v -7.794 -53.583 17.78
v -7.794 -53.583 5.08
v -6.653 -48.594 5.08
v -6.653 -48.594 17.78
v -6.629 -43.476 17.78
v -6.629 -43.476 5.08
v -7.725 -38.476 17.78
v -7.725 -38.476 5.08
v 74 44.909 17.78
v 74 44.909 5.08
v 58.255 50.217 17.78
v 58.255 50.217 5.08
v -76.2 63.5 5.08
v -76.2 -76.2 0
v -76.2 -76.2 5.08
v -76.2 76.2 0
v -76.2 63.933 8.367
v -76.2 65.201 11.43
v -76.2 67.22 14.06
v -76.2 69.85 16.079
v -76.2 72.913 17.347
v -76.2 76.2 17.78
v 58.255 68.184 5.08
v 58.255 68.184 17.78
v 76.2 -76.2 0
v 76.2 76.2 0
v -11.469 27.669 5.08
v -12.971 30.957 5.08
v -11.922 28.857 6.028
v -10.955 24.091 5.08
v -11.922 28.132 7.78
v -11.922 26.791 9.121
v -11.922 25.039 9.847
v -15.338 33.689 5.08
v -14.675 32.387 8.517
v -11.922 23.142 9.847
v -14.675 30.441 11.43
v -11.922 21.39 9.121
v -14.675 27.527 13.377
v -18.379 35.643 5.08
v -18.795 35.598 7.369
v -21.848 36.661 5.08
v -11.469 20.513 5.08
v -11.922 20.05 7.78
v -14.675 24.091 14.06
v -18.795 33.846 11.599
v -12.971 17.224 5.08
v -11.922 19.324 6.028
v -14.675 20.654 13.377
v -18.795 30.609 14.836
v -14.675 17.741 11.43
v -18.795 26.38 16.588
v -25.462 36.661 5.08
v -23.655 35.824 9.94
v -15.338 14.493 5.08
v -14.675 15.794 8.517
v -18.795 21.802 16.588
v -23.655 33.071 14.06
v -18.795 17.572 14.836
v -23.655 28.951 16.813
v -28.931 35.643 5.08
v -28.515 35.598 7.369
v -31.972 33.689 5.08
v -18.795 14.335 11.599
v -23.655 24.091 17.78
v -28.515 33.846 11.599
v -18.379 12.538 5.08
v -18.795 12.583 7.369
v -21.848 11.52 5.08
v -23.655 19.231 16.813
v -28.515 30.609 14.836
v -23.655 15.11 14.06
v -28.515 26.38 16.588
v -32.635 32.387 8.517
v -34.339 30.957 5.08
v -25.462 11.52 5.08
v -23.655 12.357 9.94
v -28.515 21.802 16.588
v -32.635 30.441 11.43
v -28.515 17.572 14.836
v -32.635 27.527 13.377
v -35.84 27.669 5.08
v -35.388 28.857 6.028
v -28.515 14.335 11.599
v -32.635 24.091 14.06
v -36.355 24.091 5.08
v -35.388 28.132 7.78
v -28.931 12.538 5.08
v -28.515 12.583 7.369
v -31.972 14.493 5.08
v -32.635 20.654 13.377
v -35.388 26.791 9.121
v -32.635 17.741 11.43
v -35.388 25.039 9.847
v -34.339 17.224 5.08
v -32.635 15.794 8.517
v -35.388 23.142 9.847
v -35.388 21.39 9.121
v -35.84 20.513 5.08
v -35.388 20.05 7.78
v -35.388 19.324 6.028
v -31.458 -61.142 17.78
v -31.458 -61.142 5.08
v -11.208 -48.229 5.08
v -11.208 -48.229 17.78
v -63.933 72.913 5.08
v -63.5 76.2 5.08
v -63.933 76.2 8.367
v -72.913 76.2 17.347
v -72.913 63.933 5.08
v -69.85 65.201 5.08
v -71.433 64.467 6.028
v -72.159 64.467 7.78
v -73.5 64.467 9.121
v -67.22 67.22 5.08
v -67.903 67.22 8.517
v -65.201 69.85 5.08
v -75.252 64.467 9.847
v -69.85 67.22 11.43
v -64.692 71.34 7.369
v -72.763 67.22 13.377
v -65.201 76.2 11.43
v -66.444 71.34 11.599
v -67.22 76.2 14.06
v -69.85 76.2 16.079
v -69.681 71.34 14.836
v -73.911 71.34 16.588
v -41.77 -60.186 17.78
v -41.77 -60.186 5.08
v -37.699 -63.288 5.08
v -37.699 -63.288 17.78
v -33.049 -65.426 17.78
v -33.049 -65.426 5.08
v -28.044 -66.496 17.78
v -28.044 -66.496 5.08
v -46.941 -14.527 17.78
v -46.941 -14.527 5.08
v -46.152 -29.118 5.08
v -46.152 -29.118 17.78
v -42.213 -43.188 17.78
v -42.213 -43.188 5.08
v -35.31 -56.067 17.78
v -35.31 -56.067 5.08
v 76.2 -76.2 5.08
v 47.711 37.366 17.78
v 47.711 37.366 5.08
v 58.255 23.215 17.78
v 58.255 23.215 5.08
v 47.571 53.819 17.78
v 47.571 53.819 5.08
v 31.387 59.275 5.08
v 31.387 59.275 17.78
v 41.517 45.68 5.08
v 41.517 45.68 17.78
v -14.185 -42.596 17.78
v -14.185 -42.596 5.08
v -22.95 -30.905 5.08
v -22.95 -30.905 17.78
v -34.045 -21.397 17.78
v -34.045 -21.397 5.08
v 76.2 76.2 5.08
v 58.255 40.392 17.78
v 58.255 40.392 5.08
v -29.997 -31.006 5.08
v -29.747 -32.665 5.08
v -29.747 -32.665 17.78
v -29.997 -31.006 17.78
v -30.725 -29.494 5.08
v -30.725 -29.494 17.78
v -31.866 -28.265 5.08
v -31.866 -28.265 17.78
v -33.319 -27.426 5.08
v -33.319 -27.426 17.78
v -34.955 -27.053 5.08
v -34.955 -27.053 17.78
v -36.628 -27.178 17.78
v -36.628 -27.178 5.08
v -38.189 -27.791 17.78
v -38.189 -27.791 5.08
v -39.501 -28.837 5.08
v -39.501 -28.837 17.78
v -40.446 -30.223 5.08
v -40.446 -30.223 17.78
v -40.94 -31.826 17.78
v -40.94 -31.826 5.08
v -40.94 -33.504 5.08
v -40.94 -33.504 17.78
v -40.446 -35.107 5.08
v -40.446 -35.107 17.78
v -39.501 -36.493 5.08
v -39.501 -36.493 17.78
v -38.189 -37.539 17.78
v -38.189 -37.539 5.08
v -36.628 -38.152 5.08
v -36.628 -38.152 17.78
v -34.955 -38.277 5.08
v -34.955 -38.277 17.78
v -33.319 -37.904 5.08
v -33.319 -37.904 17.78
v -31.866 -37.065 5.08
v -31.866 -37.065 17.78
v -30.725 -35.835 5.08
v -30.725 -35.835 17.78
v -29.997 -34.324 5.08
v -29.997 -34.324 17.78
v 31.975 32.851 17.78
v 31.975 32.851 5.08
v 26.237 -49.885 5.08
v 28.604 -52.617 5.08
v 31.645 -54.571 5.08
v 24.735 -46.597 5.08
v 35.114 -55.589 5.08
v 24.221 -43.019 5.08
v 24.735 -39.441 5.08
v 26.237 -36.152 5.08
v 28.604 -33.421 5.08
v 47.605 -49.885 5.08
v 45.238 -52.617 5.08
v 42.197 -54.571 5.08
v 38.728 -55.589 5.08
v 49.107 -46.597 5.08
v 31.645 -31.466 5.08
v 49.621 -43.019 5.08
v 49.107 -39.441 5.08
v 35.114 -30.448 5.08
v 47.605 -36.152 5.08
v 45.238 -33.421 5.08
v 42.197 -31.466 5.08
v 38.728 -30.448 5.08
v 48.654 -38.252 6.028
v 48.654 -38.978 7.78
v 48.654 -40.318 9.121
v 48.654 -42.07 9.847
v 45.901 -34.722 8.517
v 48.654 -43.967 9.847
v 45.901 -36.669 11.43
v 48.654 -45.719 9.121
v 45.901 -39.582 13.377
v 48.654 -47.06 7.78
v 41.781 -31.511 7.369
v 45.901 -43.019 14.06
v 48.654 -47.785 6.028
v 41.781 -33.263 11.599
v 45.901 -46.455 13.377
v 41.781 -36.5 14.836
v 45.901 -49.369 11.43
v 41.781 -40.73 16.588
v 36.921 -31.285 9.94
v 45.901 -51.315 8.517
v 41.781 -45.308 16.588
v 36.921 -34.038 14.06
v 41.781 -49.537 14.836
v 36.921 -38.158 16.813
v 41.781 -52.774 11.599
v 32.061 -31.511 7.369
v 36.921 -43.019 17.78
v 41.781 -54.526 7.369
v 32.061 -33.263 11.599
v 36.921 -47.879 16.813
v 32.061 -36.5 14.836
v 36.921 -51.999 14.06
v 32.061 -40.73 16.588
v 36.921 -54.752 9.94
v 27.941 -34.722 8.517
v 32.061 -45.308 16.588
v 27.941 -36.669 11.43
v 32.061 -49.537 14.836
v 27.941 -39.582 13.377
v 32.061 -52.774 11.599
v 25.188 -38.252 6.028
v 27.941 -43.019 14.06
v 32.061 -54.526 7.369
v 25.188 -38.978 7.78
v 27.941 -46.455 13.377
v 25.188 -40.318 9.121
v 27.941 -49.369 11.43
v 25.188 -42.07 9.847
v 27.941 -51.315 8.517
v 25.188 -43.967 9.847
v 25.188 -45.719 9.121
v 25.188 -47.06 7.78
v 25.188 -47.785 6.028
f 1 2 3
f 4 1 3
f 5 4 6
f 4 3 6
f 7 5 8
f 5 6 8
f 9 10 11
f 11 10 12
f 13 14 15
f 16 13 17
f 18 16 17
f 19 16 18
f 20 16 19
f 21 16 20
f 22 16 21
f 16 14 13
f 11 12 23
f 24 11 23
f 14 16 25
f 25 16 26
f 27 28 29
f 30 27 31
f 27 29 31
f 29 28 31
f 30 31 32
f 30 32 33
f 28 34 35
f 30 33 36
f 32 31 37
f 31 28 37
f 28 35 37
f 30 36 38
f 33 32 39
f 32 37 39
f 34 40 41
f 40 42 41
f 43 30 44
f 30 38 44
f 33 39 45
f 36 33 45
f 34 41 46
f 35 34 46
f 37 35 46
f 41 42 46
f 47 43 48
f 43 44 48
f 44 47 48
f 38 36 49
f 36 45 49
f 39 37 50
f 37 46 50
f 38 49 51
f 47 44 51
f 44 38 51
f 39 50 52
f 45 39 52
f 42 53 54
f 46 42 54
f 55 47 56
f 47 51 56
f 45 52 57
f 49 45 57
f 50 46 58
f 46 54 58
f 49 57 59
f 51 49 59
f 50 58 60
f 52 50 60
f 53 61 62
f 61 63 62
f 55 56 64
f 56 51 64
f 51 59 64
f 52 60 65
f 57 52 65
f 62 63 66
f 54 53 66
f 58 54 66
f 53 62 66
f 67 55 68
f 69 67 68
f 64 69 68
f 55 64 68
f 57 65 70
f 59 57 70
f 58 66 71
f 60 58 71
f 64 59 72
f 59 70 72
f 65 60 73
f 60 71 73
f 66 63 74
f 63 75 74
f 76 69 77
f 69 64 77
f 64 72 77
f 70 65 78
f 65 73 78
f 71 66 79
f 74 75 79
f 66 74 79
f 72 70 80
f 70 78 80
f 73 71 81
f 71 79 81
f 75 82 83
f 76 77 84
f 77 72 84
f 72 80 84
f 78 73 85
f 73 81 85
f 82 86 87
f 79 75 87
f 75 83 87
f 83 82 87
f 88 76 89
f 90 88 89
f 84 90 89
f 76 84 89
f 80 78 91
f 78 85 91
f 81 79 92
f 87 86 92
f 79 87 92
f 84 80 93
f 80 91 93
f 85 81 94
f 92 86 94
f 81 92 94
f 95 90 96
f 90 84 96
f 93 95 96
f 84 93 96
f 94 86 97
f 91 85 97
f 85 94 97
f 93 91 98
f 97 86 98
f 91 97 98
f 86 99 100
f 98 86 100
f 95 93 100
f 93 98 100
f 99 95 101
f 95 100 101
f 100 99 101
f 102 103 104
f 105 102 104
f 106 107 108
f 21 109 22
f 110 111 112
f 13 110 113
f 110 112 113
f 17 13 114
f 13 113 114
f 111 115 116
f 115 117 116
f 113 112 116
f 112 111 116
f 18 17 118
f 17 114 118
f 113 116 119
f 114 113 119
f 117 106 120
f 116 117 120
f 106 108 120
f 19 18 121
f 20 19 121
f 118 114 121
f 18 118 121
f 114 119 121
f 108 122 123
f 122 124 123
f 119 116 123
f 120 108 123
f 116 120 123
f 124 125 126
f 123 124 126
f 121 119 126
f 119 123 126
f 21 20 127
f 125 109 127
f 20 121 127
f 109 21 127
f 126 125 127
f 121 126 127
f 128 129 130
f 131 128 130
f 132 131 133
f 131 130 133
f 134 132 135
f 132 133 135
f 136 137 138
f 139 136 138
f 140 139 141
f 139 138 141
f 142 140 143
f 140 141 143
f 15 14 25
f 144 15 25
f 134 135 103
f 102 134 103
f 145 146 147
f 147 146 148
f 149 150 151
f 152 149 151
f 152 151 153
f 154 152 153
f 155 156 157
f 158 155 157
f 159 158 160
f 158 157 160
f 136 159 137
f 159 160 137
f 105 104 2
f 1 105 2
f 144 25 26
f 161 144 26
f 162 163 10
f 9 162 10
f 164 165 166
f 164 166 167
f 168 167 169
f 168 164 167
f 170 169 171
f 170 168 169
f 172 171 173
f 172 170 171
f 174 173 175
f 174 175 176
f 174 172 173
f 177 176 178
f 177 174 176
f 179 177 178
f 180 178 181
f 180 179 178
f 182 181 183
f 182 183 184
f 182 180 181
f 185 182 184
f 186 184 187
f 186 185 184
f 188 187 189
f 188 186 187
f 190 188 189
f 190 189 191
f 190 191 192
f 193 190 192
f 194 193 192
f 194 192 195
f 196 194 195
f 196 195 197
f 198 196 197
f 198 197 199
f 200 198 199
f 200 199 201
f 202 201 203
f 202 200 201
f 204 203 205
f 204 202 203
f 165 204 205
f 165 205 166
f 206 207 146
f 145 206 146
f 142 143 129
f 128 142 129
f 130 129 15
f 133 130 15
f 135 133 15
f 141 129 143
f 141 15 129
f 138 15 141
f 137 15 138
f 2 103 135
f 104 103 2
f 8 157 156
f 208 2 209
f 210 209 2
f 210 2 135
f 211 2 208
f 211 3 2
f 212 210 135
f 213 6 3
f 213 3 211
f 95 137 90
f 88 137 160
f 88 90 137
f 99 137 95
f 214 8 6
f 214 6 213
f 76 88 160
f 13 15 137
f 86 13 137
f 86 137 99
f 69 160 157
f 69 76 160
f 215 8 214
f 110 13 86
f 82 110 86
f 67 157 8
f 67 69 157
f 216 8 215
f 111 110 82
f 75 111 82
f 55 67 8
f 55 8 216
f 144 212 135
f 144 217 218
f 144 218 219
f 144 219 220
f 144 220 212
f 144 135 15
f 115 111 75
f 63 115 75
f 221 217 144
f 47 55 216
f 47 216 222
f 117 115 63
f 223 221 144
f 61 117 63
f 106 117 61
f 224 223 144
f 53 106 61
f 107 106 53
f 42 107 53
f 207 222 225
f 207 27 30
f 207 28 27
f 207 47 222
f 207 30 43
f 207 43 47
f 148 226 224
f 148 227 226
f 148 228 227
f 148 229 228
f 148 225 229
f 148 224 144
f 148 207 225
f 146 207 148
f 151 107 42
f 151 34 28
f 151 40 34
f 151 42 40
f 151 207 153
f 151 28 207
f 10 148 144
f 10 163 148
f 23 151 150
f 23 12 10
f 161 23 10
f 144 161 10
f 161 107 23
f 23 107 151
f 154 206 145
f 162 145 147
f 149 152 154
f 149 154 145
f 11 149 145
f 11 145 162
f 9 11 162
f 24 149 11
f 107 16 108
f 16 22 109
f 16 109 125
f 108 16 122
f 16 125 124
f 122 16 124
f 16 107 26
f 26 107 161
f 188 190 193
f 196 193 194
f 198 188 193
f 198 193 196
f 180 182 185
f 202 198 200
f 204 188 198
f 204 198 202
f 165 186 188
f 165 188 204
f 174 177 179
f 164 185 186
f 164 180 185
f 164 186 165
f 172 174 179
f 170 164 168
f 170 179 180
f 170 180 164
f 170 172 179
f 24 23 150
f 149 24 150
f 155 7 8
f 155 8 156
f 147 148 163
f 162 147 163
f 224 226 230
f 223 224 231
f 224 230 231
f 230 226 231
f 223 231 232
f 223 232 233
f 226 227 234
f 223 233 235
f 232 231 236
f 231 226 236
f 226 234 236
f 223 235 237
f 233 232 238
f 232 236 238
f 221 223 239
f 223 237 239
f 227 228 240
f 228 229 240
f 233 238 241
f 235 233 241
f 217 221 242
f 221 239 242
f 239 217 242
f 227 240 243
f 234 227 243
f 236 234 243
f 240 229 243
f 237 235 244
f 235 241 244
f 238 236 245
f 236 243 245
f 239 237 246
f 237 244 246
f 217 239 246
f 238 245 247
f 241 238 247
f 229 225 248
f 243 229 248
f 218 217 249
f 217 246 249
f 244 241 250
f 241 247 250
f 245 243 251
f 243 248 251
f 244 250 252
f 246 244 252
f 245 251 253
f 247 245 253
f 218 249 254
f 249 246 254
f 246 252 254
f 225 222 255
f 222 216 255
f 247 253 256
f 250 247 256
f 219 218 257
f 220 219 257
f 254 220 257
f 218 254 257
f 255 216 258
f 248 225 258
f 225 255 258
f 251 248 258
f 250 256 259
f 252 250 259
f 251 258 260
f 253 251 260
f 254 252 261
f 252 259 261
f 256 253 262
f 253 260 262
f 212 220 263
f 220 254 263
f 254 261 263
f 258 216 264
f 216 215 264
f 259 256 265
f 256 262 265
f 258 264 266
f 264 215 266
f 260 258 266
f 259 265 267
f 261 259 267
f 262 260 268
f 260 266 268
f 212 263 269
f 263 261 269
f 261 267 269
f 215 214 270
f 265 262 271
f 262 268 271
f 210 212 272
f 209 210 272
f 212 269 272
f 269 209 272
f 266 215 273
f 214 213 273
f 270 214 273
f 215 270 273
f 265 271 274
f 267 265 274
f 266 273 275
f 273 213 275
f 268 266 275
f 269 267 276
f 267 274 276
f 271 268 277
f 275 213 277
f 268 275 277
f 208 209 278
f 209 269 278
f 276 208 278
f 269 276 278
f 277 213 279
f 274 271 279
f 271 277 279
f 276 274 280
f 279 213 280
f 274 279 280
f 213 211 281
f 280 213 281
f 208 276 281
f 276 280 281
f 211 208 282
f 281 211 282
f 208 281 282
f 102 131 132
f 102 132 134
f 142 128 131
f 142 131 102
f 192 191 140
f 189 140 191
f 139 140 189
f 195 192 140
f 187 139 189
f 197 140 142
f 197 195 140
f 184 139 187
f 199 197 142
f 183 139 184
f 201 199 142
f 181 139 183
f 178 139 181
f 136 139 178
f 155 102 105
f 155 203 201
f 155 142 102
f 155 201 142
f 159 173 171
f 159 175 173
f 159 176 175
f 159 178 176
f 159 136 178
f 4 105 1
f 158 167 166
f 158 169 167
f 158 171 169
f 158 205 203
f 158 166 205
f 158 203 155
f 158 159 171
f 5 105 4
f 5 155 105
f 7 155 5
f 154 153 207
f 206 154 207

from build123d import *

# Parameters (mm, degrees)
F0_W     = 152.4
F0_H     = 152.4
F2_DEPTH = 5.08
F5_ANGLE = 90
F6_ANGLE = 180
F7_ANGLE = 180
F4_R     = 5.6279425354
F8_DEPTH = 12.7


with BuildPart() as f2:
    # F0 (on Top) → F2 (new body)
    with BuildSketch(Plane.XY):
        Rectangle(F0_W, F0_H)
    extrude(amount=F2_DEPTH)

    # F4 (on face) → F5 (revolve)
    with BuildSketch(Plane.XY.offset(5.08)):
        with BuildLine():
            Line((-76.2, 76.2), (-76.2, 63.5))
            ThreePointArc((-76.2, 63.5), (-67.2197438789, 67.2197438789), (-63.5, 76.2))
            Line((-63.5, 76.2), (-76.2, 76.2))
        make_face()
    revolve(axis=Axis((-76.2, 0, 5.08), (0, -1, 0)), revolution_arc=F5_ANGLE)

    # F4 (on face) → F6 (revolve)
    with BuildSketch(Plane.XY.offset(5.08)):
        with BuildLine():
            Line((24.2210256122, -43.0185761551), (49.6210256122, -43.0185761551))
            ThreePointArc((49.6210256122, -43.0185761551), (36.9210256122, -30.3185761551), (24.2210256122, -43.0185761551))
        make_face()
    revolve(axis=Axis((36.9210256122, -43.0185761551, 5.08), (1, 0, 0)), revolution_arc=F6_ANGLE)

    # F4 (on face) → F7 (revolve)
    with BuildSketch(Plane.XY.offset(5.08)):
        with BuildLine():
            ThreePointArc((-10.9549105823, 24.090602994), (-23.6549105823, 36.790602994), (-36.3549105823, 24.090602994))
            Line((-36.3549105823, 24.090602994), (-10.9549105823, 24.090602994))
        make_face()
    revolve(axis=Axis((-23.6549105823, 24.090602994, 5.08), (1, 0, 0)), revolution_arc=F7_ANGLE)

    # F4 (on face) → F8 (join)
    with BuildSketch(Plane.XY.offset(5.08)):
        Polygon((47.570896451, 53.8189061847), (31.3873370203, 59.2746157033), (41.5168850169, 45.6796259761), (31.9747962058, 32.8508205712), (47.7112500038, 37.36609329), (58.2554601133, 23.2145804912), (58.2554601133, 40.3915515578), (74.0002126055, 44.9092054273), (58.2554601133, 50.2169868464), (58.2554601133, 68.1837052107), align=None)
        with BuildLine():
            ThreePointArc((-35.3100343123, -56.0667765948), (-33.4447317203, -58.6502472307), (-31.4584446243, -61.1419008701))
            Line((-31.4584446243, -61.1419008701), (-11.2081296183, -48.2286563014))
            ThreePointArc((-11.2081296183, -48.2286563014), (-12.6293719871, -45.3766842792), (-14.1848974706, -42.5956746142))
            ThreePointArc((-14.1848974706, -42.5956746142), (-28.2369814707, -25.8469443278), (-46.9412207919, -14.5273832774))
            ThreePointArc((-46.9412207919, -14.5273832774), (-44.5680834417, -36.2609805423), (-35.3100343123, -56.0667765948))
        make_face()
        with Locations((-35.3753649504, -32.6647478149)):
            Circle(F4_R, mode=Mode.SUBTRACT)
        with BuildLine():
            ThreePointArc((-14.1848974706, -42.5956746142), (-12.6293719871, -45.3766842792), (-11.2081296183, -48.2286563014))
            Line((-11.2081296183, -48.2286563014), (-7.7939508483, -53.5827092826))
            ThreePointArc((-7.7939508483, -53.5827092826), (-6.5000191862, -46.0352288655), (-7.7248563313, -38.4762280214))
            Line((-7.7248563313, -38.4762280214), (-14.1848974706, -42.5956746142))
        make_face()
        with BuildLine():
            Line((-28.0442658543, -66.4959538513), (-31.4584446243, -61.1419008701))
            ThreePointArc((-31.4584446243, -61.1419008701), (-33.4447317203, -58.6502472307), (-35.3100343123, -56.0667765948))
            Line((-35.3100343123, -56.0667765948), (-41.7700754515, -60.1862231876))
            ThreePointArc((-41.7700754515, -60.1862231876), (-35.4331949634, -64.4853702509), (-28.0442658543, -66.4959538513))
        make_face()
    extrude(amount=F8_DEPTH)


solid = f2.part
